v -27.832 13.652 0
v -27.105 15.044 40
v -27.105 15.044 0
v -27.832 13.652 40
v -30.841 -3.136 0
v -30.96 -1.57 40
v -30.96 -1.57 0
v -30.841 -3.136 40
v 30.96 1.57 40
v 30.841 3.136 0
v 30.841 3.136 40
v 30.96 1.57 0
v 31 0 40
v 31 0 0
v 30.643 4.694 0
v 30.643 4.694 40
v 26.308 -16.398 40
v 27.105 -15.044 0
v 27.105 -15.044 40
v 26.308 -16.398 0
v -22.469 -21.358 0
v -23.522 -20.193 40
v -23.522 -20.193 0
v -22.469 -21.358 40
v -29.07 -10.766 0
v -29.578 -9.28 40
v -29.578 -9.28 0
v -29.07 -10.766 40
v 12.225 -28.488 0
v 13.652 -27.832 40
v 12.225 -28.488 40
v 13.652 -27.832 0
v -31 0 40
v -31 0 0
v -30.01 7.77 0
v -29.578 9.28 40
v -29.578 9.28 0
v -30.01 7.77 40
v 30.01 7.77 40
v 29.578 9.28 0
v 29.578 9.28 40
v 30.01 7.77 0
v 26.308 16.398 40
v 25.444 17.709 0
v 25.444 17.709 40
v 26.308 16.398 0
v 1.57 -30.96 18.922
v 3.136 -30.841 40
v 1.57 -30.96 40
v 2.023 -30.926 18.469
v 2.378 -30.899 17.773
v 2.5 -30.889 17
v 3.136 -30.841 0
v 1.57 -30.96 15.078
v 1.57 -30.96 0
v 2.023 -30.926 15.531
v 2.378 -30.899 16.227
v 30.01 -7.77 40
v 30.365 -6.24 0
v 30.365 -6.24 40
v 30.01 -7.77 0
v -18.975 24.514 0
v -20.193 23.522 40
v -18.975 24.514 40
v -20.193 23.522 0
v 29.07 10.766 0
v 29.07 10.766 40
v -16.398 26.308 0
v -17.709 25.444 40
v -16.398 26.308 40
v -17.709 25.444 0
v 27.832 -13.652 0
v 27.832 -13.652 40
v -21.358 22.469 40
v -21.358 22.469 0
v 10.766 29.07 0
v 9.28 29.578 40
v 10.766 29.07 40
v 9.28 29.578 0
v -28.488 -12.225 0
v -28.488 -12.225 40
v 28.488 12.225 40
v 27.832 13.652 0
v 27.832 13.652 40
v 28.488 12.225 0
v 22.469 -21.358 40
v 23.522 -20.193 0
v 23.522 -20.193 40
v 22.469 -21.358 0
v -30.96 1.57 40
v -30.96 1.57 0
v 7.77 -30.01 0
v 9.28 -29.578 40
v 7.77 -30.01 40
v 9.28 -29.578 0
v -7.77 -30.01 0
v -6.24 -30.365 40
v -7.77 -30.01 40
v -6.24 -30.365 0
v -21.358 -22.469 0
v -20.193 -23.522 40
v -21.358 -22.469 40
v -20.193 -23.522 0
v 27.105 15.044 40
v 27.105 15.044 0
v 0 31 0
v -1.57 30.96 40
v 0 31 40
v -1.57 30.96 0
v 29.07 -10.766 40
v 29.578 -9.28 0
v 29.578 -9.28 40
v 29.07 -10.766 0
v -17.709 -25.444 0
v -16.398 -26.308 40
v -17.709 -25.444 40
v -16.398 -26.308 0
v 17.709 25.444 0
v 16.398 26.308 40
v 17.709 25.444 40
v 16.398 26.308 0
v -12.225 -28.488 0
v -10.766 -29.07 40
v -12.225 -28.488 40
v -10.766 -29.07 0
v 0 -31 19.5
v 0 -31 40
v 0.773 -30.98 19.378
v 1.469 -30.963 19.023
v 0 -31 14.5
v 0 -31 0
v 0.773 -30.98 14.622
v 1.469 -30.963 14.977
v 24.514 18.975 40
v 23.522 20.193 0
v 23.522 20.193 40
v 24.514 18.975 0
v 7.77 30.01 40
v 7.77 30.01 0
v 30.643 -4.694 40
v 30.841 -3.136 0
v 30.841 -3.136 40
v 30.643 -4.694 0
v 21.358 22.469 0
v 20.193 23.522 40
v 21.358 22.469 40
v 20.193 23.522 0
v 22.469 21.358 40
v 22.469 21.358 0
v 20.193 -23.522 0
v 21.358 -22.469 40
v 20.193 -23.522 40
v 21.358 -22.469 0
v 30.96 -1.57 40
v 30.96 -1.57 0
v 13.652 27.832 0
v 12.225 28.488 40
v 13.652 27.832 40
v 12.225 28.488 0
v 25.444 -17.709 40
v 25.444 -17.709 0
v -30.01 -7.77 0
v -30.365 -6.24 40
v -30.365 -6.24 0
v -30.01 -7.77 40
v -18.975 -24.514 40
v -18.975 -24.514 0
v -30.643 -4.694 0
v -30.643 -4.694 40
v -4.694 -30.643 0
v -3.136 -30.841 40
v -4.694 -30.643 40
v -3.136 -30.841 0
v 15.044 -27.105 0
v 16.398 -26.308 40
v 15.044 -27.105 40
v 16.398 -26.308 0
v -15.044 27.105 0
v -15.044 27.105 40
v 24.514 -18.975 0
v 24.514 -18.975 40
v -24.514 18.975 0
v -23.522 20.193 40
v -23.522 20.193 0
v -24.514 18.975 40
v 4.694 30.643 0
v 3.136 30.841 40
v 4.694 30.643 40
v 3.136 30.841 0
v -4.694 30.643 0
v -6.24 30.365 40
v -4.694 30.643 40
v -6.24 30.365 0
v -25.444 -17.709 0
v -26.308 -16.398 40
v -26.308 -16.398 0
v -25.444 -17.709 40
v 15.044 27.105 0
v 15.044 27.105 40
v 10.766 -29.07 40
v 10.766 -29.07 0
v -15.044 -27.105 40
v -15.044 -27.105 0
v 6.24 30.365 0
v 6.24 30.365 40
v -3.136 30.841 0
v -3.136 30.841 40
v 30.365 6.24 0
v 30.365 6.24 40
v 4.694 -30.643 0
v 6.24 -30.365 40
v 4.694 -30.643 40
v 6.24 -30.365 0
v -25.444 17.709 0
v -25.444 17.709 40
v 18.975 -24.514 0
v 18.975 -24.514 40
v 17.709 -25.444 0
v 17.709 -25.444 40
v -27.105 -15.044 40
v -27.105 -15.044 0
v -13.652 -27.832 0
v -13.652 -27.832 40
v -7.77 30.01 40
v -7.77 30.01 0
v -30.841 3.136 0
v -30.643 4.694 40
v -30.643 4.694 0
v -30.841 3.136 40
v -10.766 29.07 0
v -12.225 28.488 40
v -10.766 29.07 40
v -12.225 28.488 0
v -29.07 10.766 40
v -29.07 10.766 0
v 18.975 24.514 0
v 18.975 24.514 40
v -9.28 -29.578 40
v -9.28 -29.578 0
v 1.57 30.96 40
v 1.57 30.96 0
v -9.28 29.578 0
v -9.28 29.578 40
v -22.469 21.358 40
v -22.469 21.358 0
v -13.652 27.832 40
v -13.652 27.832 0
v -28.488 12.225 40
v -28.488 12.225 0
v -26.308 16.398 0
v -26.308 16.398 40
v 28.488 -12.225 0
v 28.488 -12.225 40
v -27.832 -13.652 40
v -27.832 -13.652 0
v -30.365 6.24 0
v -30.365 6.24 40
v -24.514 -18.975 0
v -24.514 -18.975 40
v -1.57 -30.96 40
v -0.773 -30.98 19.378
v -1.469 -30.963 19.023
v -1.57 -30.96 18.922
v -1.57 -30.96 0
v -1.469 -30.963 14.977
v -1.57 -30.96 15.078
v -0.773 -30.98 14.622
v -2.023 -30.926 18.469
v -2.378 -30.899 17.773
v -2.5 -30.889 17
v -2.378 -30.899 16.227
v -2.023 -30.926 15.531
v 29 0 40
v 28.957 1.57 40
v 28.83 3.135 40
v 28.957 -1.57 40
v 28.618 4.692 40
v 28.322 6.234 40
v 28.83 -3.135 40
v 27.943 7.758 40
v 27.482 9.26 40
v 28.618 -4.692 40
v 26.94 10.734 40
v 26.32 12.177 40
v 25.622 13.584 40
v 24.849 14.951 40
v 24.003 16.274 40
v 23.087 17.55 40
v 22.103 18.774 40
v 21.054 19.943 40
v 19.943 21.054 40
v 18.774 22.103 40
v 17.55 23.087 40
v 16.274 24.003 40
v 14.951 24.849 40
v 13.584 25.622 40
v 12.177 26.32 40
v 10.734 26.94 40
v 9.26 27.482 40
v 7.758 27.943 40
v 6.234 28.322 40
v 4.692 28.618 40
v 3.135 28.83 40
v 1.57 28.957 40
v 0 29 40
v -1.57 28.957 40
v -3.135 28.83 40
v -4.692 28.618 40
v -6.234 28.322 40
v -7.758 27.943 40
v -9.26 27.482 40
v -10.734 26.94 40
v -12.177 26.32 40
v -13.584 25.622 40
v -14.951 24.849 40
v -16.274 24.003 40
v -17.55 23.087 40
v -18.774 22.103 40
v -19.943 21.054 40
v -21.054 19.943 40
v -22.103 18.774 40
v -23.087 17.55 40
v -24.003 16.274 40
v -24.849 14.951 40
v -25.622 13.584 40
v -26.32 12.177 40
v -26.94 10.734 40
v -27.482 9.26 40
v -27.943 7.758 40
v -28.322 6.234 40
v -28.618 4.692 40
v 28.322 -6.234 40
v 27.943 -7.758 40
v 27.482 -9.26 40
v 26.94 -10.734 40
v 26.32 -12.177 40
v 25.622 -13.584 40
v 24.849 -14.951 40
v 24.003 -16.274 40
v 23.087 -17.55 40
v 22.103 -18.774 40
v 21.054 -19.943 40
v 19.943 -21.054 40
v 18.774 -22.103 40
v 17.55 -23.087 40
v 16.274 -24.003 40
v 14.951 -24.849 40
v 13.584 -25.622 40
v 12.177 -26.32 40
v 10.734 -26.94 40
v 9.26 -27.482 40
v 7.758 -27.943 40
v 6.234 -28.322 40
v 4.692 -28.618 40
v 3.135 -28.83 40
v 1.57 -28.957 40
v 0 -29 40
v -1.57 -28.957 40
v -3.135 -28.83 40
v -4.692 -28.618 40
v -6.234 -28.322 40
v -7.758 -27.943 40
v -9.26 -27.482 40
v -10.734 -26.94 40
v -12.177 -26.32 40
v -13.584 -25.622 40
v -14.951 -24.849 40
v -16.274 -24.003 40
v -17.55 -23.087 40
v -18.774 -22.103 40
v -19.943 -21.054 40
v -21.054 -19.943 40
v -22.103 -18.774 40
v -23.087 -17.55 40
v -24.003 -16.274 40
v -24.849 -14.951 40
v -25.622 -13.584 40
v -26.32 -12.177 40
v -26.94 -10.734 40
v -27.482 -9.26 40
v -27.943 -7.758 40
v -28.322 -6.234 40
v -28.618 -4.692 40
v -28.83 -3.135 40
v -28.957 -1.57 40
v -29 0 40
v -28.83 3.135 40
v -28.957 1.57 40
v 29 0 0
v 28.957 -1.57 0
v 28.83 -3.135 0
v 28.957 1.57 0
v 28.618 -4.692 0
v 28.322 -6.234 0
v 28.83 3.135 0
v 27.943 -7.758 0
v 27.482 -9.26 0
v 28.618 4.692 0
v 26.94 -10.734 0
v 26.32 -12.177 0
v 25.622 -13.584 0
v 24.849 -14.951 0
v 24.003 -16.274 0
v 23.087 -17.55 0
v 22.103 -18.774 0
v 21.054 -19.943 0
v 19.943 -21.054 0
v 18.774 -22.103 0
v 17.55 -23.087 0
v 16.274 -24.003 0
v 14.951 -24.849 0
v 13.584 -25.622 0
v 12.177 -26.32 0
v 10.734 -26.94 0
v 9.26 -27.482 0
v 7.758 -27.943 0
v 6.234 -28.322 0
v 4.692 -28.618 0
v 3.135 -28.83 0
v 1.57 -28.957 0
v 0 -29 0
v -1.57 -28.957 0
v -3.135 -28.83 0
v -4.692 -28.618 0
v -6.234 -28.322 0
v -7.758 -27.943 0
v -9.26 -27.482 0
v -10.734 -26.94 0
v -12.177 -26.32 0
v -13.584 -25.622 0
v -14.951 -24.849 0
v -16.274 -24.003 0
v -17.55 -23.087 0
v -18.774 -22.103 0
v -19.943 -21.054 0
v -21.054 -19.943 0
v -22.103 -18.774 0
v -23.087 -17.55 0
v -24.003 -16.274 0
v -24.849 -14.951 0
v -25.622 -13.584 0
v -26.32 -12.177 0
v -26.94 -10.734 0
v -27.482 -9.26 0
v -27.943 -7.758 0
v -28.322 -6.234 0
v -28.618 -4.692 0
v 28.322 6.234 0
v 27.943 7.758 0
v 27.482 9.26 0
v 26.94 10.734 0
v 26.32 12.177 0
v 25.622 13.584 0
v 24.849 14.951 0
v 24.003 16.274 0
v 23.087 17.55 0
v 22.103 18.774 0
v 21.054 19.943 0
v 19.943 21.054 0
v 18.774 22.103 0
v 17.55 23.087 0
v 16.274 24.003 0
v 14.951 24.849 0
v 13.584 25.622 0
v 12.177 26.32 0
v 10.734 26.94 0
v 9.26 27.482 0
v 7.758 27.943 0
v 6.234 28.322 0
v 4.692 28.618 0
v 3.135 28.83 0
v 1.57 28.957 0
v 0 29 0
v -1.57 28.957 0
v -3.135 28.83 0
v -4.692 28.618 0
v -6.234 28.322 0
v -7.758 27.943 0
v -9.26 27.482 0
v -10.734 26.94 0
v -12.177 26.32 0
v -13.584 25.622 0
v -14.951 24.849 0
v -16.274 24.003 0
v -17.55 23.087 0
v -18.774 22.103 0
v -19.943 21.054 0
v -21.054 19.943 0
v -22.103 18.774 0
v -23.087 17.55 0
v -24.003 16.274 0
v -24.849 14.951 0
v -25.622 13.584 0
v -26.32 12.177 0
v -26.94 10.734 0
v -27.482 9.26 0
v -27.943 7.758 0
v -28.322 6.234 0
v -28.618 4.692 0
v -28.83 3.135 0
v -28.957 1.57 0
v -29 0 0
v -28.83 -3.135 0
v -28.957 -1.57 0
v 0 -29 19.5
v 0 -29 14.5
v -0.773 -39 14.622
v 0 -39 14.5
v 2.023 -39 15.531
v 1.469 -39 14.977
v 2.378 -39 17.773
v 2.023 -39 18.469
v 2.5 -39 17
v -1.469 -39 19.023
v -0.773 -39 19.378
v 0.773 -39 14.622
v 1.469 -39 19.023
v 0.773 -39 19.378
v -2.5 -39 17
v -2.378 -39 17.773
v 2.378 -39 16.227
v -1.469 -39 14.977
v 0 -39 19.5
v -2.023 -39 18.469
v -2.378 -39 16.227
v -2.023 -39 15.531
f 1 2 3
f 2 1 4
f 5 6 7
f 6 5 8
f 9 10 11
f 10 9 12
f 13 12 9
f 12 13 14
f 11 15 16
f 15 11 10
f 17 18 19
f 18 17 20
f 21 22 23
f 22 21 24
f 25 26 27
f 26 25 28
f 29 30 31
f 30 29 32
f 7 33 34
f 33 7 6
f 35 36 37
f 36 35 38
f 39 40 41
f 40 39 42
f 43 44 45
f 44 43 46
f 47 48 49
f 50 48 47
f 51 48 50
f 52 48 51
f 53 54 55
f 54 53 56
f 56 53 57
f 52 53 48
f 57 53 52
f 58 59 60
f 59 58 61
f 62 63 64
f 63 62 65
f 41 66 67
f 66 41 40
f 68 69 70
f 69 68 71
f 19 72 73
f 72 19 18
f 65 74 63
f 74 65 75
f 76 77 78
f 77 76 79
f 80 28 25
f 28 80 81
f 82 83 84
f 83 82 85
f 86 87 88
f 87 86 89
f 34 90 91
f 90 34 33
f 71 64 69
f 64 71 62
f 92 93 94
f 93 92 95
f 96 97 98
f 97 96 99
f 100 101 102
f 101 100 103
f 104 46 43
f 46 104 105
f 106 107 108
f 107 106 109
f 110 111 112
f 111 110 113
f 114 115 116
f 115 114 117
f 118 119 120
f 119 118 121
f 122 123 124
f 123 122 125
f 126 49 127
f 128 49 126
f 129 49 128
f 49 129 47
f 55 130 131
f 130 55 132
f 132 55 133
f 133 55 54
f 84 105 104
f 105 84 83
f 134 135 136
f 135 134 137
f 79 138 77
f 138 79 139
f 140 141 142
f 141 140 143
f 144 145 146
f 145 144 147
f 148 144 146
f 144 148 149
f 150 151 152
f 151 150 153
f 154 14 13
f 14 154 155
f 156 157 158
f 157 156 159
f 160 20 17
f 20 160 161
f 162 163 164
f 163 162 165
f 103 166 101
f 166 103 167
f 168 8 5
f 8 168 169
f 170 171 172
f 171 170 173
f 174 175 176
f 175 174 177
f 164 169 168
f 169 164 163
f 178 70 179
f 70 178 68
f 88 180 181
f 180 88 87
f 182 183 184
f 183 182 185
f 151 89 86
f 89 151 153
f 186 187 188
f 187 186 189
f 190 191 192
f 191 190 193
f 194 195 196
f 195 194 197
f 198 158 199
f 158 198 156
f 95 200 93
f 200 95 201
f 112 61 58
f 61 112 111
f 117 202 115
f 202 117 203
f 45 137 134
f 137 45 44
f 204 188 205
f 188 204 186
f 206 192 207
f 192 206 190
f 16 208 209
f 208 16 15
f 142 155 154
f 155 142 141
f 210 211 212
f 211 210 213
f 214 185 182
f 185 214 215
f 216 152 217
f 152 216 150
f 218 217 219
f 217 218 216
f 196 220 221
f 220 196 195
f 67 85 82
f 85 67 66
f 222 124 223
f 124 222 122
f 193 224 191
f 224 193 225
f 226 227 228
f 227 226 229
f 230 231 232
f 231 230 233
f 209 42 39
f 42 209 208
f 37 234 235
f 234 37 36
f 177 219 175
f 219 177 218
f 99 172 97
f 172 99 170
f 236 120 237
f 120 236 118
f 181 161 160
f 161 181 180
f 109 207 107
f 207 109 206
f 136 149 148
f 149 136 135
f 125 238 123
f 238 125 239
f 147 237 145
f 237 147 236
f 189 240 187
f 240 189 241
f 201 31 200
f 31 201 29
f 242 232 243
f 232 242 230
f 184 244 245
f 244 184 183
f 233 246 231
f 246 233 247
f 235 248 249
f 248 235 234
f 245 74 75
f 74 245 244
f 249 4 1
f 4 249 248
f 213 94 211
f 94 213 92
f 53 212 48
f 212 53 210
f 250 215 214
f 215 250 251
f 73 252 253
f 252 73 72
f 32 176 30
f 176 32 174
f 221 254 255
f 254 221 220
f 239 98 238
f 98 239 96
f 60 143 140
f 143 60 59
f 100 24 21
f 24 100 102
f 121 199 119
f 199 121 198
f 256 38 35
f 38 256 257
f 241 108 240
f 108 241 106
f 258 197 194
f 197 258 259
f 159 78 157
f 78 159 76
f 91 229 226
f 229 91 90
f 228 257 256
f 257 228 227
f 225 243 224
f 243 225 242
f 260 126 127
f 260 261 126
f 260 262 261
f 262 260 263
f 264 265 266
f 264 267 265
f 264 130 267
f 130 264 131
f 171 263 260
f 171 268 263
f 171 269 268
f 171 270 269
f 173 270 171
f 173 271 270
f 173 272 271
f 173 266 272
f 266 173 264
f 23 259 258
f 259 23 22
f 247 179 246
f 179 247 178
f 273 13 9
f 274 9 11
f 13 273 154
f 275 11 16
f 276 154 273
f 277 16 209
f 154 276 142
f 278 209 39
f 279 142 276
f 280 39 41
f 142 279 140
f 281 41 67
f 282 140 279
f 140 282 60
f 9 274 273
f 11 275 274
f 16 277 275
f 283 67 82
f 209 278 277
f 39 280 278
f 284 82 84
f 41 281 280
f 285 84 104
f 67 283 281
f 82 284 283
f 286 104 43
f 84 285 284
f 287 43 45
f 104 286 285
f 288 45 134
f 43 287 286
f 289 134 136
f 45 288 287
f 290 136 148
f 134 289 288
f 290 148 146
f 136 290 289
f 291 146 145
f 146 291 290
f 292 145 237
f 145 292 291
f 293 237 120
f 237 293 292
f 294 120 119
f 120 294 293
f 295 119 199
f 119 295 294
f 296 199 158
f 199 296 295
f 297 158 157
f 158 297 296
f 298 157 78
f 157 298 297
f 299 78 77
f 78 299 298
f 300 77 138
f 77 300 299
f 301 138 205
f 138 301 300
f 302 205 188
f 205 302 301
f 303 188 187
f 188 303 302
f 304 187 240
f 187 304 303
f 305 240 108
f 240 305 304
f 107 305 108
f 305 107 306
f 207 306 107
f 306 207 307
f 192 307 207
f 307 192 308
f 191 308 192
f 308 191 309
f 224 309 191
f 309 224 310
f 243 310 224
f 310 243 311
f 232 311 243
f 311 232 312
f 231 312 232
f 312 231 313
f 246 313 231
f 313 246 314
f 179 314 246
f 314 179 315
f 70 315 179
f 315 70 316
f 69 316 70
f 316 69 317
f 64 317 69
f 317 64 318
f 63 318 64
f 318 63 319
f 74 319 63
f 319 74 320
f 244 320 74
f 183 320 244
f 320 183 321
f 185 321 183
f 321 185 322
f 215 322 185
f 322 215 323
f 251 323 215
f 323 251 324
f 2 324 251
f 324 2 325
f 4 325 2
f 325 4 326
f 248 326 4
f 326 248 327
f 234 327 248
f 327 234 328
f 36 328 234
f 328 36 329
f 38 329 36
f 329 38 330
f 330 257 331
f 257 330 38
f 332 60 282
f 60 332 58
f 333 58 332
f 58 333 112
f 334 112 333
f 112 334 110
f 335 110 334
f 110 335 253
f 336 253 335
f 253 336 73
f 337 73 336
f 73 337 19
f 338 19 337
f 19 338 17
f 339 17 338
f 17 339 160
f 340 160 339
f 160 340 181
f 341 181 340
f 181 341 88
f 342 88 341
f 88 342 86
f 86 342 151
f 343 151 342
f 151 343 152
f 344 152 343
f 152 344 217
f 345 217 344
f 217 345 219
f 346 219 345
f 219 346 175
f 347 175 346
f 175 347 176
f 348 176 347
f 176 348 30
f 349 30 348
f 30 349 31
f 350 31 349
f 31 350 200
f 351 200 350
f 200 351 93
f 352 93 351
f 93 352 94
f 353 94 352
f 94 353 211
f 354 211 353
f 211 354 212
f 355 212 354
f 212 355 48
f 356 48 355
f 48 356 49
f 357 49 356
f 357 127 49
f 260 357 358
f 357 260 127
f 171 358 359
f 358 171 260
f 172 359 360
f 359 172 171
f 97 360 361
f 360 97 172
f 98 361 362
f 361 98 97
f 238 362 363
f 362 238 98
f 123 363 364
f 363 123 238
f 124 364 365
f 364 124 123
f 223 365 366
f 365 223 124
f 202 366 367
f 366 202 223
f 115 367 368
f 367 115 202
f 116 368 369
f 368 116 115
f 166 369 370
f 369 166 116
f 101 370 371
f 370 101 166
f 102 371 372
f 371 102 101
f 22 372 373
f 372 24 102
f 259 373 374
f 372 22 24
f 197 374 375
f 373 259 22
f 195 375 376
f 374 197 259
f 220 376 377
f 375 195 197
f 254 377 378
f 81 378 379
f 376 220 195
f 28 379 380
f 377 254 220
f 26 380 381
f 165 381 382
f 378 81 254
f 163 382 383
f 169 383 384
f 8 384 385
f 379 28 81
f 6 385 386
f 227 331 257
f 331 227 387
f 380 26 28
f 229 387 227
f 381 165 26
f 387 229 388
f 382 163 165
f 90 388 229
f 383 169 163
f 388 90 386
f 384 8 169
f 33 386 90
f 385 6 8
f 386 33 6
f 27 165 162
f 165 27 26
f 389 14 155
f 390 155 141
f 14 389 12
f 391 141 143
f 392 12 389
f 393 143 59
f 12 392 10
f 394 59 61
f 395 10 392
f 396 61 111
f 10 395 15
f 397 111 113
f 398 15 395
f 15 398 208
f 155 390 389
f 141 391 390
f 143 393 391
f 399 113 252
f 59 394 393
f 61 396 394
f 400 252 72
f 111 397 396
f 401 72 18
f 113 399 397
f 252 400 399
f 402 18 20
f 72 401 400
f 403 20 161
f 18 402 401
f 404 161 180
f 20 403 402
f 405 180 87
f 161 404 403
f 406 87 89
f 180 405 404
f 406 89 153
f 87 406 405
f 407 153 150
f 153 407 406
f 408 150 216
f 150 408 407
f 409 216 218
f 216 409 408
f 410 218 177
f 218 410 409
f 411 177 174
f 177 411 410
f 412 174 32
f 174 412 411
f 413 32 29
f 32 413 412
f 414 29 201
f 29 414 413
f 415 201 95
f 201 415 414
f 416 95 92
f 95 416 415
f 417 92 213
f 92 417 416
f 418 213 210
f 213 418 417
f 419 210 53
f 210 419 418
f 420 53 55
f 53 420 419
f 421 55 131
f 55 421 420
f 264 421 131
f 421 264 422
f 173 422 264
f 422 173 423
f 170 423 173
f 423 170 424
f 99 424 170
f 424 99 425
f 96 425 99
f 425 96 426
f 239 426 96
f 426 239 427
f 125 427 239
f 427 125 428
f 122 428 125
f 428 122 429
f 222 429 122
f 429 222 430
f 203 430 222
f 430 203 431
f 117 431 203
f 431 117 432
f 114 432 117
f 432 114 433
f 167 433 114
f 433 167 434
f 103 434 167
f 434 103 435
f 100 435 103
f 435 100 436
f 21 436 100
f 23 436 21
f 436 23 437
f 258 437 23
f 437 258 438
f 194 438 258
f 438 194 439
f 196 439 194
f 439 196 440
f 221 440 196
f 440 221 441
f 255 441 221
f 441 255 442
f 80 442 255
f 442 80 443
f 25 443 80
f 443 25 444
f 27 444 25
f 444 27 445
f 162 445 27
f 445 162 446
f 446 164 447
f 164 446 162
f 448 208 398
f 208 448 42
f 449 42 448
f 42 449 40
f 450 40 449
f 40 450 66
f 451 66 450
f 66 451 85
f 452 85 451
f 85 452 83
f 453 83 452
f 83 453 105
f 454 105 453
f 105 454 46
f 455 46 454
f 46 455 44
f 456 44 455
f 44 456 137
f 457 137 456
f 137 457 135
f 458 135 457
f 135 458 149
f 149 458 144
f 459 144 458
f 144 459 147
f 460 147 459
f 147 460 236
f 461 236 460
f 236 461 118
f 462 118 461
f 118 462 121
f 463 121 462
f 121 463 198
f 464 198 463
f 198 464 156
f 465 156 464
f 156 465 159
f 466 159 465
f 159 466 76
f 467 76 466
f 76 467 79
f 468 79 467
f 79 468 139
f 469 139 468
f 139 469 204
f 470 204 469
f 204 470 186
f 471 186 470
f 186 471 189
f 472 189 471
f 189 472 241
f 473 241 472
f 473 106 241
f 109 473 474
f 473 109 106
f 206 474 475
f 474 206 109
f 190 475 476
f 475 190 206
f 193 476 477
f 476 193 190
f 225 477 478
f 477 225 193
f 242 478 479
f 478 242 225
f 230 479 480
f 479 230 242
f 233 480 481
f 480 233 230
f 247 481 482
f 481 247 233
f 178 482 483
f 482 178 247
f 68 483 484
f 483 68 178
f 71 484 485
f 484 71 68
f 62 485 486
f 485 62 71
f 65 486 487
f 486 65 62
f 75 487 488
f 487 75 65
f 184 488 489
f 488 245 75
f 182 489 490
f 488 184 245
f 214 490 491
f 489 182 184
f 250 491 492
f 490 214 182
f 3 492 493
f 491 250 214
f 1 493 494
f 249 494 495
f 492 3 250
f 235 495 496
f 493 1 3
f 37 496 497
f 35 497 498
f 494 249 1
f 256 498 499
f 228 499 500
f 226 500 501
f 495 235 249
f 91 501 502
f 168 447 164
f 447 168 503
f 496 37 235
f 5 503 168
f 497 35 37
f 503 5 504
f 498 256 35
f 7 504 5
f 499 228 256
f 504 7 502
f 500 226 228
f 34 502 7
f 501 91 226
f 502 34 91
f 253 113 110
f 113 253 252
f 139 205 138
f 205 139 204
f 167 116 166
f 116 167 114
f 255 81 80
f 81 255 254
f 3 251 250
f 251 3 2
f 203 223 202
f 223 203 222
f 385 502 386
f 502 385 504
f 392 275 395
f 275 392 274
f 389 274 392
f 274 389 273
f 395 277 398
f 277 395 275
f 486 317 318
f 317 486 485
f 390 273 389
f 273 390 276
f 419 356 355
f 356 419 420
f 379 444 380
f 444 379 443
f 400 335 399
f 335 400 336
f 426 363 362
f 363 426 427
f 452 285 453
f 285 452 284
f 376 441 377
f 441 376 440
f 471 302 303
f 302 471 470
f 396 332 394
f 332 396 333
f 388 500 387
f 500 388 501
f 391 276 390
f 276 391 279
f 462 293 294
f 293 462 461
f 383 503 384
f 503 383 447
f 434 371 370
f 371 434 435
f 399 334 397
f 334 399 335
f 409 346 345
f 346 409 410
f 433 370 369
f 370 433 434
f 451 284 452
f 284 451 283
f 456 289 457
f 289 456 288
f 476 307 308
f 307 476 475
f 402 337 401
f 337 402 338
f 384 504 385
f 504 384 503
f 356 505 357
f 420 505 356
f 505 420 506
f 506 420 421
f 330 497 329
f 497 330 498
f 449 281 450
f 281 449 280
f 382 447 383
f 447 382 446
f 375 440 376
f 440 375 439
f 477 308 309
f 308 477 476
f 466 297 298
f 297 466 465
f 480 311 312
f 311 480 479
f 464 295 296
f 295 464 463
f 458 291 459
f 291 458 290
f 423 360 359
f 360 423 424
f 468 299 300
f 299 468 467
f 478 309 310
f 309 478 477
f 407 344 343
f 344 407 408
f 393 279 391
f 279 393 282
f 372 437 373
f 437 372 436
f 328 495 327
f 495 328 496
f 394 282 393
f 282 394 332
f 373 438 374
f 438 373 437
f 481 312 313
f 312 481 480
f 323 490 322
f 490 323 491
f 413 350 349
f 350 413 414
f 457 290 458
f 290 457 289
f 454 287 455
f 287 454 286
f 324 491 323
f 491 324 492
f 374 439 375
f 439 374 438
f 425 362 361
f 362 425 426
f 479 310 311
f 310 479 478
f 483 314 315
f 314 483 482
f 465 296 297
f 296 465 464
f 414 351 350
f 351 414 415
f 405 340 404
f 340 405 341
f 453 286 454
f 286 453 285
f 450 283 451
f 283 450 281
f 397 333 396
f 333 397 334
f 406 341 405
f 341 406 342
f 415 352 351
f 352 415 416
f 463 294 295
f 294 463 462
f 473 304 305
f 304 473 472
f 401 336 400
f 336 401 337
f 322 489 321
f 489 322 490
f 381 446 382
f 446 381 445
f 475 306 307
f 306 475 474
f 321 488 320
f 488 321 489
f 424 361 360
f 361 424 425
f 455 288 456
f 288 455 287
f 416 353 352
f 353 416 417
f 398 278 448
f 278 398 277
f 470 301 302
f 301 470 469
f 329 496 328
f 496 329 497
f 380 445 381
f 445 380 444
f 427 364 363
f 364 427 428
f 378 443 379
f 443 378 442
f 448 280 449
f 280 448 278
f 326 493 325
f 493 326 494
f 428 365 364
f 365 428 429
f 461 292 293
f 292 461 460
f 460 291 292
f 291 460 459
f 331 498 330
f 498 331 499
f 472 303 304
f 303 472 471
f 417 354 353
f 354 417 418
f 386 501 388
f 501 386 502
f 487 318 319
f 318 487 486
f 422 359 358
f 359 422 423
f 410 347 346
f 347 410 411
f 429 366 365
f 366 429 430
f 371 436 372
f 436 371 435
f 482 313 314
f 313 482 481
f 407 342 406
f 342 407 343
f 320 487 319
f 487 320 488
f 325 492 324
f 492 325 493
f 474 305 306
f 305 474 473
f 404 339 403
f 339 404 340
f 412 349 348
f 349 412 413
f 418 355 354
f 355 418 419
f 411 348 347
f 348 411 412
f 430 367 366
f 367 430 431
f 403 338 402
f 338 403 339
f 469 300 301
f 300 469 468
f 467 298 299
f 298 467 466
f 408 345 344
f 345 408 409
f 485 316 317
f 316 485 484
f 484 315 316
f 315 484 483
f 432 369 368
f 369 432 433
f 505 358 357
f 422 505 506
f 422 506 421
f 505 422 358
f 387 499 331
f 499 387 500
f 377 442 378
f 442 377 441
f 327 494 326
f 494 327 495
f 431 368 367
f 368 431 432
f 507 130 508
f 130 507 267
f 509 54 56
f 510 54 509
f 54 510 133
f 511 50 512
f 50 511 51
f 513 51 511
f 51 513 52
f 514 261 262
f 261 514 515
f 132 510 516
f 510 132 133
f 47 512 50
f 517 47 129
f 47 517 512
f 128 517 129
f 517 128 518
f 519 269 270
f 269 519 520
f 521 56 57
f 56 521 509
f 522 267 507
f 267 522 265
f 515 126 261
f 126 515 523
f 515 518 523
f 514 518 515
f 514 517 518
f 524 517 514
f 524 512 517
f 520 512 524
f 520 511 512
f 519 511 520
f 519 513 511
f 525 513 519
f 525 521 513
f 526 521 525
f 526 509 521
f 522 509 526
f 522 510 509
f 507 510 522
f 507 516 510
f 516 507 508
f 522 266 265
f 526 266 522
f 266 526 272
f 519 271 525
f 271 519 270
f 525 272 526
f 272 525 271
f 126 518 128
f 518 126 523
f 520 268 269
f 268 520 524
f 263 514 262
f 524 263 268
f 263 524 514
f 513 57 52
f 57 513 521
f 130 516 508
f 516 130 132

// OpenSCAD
id=58;
od=id+4;

ring(od,id,40);
translate([0,id*-.5,17]) rotate([90,0,0]) cylinder(d=5,h=10,$fn=20);

module ring_adv(odB,idB,odT,idT,h)
{
  difference(){
    cylinder(d1=odB,d2=odT,h=h,$fn=80);
    translate([0,0,-0.1]) cylinder(d1=idB,d2=idT,h=h+.2,$fn=80);
  }
}
module ring_cone(odB,odT,t,h)
{
  difference(){
    cylinder(d1=odB,d2=odT,h=h,$fn=odB*2);
    translate([0,0,-0.1]) cylinder(d1=odB-t,d2=odT-t,h=h+.2,$fn=odB*2-t*2);
  }
}

module ring(od,id,h)
{
  difference(){
    cylinder(d=od,h=h,$fn=od*2);
    translate([0,0,-0.01]) cylinder(d=id,h=h+0.02,$fn=id*2);
  }
}
